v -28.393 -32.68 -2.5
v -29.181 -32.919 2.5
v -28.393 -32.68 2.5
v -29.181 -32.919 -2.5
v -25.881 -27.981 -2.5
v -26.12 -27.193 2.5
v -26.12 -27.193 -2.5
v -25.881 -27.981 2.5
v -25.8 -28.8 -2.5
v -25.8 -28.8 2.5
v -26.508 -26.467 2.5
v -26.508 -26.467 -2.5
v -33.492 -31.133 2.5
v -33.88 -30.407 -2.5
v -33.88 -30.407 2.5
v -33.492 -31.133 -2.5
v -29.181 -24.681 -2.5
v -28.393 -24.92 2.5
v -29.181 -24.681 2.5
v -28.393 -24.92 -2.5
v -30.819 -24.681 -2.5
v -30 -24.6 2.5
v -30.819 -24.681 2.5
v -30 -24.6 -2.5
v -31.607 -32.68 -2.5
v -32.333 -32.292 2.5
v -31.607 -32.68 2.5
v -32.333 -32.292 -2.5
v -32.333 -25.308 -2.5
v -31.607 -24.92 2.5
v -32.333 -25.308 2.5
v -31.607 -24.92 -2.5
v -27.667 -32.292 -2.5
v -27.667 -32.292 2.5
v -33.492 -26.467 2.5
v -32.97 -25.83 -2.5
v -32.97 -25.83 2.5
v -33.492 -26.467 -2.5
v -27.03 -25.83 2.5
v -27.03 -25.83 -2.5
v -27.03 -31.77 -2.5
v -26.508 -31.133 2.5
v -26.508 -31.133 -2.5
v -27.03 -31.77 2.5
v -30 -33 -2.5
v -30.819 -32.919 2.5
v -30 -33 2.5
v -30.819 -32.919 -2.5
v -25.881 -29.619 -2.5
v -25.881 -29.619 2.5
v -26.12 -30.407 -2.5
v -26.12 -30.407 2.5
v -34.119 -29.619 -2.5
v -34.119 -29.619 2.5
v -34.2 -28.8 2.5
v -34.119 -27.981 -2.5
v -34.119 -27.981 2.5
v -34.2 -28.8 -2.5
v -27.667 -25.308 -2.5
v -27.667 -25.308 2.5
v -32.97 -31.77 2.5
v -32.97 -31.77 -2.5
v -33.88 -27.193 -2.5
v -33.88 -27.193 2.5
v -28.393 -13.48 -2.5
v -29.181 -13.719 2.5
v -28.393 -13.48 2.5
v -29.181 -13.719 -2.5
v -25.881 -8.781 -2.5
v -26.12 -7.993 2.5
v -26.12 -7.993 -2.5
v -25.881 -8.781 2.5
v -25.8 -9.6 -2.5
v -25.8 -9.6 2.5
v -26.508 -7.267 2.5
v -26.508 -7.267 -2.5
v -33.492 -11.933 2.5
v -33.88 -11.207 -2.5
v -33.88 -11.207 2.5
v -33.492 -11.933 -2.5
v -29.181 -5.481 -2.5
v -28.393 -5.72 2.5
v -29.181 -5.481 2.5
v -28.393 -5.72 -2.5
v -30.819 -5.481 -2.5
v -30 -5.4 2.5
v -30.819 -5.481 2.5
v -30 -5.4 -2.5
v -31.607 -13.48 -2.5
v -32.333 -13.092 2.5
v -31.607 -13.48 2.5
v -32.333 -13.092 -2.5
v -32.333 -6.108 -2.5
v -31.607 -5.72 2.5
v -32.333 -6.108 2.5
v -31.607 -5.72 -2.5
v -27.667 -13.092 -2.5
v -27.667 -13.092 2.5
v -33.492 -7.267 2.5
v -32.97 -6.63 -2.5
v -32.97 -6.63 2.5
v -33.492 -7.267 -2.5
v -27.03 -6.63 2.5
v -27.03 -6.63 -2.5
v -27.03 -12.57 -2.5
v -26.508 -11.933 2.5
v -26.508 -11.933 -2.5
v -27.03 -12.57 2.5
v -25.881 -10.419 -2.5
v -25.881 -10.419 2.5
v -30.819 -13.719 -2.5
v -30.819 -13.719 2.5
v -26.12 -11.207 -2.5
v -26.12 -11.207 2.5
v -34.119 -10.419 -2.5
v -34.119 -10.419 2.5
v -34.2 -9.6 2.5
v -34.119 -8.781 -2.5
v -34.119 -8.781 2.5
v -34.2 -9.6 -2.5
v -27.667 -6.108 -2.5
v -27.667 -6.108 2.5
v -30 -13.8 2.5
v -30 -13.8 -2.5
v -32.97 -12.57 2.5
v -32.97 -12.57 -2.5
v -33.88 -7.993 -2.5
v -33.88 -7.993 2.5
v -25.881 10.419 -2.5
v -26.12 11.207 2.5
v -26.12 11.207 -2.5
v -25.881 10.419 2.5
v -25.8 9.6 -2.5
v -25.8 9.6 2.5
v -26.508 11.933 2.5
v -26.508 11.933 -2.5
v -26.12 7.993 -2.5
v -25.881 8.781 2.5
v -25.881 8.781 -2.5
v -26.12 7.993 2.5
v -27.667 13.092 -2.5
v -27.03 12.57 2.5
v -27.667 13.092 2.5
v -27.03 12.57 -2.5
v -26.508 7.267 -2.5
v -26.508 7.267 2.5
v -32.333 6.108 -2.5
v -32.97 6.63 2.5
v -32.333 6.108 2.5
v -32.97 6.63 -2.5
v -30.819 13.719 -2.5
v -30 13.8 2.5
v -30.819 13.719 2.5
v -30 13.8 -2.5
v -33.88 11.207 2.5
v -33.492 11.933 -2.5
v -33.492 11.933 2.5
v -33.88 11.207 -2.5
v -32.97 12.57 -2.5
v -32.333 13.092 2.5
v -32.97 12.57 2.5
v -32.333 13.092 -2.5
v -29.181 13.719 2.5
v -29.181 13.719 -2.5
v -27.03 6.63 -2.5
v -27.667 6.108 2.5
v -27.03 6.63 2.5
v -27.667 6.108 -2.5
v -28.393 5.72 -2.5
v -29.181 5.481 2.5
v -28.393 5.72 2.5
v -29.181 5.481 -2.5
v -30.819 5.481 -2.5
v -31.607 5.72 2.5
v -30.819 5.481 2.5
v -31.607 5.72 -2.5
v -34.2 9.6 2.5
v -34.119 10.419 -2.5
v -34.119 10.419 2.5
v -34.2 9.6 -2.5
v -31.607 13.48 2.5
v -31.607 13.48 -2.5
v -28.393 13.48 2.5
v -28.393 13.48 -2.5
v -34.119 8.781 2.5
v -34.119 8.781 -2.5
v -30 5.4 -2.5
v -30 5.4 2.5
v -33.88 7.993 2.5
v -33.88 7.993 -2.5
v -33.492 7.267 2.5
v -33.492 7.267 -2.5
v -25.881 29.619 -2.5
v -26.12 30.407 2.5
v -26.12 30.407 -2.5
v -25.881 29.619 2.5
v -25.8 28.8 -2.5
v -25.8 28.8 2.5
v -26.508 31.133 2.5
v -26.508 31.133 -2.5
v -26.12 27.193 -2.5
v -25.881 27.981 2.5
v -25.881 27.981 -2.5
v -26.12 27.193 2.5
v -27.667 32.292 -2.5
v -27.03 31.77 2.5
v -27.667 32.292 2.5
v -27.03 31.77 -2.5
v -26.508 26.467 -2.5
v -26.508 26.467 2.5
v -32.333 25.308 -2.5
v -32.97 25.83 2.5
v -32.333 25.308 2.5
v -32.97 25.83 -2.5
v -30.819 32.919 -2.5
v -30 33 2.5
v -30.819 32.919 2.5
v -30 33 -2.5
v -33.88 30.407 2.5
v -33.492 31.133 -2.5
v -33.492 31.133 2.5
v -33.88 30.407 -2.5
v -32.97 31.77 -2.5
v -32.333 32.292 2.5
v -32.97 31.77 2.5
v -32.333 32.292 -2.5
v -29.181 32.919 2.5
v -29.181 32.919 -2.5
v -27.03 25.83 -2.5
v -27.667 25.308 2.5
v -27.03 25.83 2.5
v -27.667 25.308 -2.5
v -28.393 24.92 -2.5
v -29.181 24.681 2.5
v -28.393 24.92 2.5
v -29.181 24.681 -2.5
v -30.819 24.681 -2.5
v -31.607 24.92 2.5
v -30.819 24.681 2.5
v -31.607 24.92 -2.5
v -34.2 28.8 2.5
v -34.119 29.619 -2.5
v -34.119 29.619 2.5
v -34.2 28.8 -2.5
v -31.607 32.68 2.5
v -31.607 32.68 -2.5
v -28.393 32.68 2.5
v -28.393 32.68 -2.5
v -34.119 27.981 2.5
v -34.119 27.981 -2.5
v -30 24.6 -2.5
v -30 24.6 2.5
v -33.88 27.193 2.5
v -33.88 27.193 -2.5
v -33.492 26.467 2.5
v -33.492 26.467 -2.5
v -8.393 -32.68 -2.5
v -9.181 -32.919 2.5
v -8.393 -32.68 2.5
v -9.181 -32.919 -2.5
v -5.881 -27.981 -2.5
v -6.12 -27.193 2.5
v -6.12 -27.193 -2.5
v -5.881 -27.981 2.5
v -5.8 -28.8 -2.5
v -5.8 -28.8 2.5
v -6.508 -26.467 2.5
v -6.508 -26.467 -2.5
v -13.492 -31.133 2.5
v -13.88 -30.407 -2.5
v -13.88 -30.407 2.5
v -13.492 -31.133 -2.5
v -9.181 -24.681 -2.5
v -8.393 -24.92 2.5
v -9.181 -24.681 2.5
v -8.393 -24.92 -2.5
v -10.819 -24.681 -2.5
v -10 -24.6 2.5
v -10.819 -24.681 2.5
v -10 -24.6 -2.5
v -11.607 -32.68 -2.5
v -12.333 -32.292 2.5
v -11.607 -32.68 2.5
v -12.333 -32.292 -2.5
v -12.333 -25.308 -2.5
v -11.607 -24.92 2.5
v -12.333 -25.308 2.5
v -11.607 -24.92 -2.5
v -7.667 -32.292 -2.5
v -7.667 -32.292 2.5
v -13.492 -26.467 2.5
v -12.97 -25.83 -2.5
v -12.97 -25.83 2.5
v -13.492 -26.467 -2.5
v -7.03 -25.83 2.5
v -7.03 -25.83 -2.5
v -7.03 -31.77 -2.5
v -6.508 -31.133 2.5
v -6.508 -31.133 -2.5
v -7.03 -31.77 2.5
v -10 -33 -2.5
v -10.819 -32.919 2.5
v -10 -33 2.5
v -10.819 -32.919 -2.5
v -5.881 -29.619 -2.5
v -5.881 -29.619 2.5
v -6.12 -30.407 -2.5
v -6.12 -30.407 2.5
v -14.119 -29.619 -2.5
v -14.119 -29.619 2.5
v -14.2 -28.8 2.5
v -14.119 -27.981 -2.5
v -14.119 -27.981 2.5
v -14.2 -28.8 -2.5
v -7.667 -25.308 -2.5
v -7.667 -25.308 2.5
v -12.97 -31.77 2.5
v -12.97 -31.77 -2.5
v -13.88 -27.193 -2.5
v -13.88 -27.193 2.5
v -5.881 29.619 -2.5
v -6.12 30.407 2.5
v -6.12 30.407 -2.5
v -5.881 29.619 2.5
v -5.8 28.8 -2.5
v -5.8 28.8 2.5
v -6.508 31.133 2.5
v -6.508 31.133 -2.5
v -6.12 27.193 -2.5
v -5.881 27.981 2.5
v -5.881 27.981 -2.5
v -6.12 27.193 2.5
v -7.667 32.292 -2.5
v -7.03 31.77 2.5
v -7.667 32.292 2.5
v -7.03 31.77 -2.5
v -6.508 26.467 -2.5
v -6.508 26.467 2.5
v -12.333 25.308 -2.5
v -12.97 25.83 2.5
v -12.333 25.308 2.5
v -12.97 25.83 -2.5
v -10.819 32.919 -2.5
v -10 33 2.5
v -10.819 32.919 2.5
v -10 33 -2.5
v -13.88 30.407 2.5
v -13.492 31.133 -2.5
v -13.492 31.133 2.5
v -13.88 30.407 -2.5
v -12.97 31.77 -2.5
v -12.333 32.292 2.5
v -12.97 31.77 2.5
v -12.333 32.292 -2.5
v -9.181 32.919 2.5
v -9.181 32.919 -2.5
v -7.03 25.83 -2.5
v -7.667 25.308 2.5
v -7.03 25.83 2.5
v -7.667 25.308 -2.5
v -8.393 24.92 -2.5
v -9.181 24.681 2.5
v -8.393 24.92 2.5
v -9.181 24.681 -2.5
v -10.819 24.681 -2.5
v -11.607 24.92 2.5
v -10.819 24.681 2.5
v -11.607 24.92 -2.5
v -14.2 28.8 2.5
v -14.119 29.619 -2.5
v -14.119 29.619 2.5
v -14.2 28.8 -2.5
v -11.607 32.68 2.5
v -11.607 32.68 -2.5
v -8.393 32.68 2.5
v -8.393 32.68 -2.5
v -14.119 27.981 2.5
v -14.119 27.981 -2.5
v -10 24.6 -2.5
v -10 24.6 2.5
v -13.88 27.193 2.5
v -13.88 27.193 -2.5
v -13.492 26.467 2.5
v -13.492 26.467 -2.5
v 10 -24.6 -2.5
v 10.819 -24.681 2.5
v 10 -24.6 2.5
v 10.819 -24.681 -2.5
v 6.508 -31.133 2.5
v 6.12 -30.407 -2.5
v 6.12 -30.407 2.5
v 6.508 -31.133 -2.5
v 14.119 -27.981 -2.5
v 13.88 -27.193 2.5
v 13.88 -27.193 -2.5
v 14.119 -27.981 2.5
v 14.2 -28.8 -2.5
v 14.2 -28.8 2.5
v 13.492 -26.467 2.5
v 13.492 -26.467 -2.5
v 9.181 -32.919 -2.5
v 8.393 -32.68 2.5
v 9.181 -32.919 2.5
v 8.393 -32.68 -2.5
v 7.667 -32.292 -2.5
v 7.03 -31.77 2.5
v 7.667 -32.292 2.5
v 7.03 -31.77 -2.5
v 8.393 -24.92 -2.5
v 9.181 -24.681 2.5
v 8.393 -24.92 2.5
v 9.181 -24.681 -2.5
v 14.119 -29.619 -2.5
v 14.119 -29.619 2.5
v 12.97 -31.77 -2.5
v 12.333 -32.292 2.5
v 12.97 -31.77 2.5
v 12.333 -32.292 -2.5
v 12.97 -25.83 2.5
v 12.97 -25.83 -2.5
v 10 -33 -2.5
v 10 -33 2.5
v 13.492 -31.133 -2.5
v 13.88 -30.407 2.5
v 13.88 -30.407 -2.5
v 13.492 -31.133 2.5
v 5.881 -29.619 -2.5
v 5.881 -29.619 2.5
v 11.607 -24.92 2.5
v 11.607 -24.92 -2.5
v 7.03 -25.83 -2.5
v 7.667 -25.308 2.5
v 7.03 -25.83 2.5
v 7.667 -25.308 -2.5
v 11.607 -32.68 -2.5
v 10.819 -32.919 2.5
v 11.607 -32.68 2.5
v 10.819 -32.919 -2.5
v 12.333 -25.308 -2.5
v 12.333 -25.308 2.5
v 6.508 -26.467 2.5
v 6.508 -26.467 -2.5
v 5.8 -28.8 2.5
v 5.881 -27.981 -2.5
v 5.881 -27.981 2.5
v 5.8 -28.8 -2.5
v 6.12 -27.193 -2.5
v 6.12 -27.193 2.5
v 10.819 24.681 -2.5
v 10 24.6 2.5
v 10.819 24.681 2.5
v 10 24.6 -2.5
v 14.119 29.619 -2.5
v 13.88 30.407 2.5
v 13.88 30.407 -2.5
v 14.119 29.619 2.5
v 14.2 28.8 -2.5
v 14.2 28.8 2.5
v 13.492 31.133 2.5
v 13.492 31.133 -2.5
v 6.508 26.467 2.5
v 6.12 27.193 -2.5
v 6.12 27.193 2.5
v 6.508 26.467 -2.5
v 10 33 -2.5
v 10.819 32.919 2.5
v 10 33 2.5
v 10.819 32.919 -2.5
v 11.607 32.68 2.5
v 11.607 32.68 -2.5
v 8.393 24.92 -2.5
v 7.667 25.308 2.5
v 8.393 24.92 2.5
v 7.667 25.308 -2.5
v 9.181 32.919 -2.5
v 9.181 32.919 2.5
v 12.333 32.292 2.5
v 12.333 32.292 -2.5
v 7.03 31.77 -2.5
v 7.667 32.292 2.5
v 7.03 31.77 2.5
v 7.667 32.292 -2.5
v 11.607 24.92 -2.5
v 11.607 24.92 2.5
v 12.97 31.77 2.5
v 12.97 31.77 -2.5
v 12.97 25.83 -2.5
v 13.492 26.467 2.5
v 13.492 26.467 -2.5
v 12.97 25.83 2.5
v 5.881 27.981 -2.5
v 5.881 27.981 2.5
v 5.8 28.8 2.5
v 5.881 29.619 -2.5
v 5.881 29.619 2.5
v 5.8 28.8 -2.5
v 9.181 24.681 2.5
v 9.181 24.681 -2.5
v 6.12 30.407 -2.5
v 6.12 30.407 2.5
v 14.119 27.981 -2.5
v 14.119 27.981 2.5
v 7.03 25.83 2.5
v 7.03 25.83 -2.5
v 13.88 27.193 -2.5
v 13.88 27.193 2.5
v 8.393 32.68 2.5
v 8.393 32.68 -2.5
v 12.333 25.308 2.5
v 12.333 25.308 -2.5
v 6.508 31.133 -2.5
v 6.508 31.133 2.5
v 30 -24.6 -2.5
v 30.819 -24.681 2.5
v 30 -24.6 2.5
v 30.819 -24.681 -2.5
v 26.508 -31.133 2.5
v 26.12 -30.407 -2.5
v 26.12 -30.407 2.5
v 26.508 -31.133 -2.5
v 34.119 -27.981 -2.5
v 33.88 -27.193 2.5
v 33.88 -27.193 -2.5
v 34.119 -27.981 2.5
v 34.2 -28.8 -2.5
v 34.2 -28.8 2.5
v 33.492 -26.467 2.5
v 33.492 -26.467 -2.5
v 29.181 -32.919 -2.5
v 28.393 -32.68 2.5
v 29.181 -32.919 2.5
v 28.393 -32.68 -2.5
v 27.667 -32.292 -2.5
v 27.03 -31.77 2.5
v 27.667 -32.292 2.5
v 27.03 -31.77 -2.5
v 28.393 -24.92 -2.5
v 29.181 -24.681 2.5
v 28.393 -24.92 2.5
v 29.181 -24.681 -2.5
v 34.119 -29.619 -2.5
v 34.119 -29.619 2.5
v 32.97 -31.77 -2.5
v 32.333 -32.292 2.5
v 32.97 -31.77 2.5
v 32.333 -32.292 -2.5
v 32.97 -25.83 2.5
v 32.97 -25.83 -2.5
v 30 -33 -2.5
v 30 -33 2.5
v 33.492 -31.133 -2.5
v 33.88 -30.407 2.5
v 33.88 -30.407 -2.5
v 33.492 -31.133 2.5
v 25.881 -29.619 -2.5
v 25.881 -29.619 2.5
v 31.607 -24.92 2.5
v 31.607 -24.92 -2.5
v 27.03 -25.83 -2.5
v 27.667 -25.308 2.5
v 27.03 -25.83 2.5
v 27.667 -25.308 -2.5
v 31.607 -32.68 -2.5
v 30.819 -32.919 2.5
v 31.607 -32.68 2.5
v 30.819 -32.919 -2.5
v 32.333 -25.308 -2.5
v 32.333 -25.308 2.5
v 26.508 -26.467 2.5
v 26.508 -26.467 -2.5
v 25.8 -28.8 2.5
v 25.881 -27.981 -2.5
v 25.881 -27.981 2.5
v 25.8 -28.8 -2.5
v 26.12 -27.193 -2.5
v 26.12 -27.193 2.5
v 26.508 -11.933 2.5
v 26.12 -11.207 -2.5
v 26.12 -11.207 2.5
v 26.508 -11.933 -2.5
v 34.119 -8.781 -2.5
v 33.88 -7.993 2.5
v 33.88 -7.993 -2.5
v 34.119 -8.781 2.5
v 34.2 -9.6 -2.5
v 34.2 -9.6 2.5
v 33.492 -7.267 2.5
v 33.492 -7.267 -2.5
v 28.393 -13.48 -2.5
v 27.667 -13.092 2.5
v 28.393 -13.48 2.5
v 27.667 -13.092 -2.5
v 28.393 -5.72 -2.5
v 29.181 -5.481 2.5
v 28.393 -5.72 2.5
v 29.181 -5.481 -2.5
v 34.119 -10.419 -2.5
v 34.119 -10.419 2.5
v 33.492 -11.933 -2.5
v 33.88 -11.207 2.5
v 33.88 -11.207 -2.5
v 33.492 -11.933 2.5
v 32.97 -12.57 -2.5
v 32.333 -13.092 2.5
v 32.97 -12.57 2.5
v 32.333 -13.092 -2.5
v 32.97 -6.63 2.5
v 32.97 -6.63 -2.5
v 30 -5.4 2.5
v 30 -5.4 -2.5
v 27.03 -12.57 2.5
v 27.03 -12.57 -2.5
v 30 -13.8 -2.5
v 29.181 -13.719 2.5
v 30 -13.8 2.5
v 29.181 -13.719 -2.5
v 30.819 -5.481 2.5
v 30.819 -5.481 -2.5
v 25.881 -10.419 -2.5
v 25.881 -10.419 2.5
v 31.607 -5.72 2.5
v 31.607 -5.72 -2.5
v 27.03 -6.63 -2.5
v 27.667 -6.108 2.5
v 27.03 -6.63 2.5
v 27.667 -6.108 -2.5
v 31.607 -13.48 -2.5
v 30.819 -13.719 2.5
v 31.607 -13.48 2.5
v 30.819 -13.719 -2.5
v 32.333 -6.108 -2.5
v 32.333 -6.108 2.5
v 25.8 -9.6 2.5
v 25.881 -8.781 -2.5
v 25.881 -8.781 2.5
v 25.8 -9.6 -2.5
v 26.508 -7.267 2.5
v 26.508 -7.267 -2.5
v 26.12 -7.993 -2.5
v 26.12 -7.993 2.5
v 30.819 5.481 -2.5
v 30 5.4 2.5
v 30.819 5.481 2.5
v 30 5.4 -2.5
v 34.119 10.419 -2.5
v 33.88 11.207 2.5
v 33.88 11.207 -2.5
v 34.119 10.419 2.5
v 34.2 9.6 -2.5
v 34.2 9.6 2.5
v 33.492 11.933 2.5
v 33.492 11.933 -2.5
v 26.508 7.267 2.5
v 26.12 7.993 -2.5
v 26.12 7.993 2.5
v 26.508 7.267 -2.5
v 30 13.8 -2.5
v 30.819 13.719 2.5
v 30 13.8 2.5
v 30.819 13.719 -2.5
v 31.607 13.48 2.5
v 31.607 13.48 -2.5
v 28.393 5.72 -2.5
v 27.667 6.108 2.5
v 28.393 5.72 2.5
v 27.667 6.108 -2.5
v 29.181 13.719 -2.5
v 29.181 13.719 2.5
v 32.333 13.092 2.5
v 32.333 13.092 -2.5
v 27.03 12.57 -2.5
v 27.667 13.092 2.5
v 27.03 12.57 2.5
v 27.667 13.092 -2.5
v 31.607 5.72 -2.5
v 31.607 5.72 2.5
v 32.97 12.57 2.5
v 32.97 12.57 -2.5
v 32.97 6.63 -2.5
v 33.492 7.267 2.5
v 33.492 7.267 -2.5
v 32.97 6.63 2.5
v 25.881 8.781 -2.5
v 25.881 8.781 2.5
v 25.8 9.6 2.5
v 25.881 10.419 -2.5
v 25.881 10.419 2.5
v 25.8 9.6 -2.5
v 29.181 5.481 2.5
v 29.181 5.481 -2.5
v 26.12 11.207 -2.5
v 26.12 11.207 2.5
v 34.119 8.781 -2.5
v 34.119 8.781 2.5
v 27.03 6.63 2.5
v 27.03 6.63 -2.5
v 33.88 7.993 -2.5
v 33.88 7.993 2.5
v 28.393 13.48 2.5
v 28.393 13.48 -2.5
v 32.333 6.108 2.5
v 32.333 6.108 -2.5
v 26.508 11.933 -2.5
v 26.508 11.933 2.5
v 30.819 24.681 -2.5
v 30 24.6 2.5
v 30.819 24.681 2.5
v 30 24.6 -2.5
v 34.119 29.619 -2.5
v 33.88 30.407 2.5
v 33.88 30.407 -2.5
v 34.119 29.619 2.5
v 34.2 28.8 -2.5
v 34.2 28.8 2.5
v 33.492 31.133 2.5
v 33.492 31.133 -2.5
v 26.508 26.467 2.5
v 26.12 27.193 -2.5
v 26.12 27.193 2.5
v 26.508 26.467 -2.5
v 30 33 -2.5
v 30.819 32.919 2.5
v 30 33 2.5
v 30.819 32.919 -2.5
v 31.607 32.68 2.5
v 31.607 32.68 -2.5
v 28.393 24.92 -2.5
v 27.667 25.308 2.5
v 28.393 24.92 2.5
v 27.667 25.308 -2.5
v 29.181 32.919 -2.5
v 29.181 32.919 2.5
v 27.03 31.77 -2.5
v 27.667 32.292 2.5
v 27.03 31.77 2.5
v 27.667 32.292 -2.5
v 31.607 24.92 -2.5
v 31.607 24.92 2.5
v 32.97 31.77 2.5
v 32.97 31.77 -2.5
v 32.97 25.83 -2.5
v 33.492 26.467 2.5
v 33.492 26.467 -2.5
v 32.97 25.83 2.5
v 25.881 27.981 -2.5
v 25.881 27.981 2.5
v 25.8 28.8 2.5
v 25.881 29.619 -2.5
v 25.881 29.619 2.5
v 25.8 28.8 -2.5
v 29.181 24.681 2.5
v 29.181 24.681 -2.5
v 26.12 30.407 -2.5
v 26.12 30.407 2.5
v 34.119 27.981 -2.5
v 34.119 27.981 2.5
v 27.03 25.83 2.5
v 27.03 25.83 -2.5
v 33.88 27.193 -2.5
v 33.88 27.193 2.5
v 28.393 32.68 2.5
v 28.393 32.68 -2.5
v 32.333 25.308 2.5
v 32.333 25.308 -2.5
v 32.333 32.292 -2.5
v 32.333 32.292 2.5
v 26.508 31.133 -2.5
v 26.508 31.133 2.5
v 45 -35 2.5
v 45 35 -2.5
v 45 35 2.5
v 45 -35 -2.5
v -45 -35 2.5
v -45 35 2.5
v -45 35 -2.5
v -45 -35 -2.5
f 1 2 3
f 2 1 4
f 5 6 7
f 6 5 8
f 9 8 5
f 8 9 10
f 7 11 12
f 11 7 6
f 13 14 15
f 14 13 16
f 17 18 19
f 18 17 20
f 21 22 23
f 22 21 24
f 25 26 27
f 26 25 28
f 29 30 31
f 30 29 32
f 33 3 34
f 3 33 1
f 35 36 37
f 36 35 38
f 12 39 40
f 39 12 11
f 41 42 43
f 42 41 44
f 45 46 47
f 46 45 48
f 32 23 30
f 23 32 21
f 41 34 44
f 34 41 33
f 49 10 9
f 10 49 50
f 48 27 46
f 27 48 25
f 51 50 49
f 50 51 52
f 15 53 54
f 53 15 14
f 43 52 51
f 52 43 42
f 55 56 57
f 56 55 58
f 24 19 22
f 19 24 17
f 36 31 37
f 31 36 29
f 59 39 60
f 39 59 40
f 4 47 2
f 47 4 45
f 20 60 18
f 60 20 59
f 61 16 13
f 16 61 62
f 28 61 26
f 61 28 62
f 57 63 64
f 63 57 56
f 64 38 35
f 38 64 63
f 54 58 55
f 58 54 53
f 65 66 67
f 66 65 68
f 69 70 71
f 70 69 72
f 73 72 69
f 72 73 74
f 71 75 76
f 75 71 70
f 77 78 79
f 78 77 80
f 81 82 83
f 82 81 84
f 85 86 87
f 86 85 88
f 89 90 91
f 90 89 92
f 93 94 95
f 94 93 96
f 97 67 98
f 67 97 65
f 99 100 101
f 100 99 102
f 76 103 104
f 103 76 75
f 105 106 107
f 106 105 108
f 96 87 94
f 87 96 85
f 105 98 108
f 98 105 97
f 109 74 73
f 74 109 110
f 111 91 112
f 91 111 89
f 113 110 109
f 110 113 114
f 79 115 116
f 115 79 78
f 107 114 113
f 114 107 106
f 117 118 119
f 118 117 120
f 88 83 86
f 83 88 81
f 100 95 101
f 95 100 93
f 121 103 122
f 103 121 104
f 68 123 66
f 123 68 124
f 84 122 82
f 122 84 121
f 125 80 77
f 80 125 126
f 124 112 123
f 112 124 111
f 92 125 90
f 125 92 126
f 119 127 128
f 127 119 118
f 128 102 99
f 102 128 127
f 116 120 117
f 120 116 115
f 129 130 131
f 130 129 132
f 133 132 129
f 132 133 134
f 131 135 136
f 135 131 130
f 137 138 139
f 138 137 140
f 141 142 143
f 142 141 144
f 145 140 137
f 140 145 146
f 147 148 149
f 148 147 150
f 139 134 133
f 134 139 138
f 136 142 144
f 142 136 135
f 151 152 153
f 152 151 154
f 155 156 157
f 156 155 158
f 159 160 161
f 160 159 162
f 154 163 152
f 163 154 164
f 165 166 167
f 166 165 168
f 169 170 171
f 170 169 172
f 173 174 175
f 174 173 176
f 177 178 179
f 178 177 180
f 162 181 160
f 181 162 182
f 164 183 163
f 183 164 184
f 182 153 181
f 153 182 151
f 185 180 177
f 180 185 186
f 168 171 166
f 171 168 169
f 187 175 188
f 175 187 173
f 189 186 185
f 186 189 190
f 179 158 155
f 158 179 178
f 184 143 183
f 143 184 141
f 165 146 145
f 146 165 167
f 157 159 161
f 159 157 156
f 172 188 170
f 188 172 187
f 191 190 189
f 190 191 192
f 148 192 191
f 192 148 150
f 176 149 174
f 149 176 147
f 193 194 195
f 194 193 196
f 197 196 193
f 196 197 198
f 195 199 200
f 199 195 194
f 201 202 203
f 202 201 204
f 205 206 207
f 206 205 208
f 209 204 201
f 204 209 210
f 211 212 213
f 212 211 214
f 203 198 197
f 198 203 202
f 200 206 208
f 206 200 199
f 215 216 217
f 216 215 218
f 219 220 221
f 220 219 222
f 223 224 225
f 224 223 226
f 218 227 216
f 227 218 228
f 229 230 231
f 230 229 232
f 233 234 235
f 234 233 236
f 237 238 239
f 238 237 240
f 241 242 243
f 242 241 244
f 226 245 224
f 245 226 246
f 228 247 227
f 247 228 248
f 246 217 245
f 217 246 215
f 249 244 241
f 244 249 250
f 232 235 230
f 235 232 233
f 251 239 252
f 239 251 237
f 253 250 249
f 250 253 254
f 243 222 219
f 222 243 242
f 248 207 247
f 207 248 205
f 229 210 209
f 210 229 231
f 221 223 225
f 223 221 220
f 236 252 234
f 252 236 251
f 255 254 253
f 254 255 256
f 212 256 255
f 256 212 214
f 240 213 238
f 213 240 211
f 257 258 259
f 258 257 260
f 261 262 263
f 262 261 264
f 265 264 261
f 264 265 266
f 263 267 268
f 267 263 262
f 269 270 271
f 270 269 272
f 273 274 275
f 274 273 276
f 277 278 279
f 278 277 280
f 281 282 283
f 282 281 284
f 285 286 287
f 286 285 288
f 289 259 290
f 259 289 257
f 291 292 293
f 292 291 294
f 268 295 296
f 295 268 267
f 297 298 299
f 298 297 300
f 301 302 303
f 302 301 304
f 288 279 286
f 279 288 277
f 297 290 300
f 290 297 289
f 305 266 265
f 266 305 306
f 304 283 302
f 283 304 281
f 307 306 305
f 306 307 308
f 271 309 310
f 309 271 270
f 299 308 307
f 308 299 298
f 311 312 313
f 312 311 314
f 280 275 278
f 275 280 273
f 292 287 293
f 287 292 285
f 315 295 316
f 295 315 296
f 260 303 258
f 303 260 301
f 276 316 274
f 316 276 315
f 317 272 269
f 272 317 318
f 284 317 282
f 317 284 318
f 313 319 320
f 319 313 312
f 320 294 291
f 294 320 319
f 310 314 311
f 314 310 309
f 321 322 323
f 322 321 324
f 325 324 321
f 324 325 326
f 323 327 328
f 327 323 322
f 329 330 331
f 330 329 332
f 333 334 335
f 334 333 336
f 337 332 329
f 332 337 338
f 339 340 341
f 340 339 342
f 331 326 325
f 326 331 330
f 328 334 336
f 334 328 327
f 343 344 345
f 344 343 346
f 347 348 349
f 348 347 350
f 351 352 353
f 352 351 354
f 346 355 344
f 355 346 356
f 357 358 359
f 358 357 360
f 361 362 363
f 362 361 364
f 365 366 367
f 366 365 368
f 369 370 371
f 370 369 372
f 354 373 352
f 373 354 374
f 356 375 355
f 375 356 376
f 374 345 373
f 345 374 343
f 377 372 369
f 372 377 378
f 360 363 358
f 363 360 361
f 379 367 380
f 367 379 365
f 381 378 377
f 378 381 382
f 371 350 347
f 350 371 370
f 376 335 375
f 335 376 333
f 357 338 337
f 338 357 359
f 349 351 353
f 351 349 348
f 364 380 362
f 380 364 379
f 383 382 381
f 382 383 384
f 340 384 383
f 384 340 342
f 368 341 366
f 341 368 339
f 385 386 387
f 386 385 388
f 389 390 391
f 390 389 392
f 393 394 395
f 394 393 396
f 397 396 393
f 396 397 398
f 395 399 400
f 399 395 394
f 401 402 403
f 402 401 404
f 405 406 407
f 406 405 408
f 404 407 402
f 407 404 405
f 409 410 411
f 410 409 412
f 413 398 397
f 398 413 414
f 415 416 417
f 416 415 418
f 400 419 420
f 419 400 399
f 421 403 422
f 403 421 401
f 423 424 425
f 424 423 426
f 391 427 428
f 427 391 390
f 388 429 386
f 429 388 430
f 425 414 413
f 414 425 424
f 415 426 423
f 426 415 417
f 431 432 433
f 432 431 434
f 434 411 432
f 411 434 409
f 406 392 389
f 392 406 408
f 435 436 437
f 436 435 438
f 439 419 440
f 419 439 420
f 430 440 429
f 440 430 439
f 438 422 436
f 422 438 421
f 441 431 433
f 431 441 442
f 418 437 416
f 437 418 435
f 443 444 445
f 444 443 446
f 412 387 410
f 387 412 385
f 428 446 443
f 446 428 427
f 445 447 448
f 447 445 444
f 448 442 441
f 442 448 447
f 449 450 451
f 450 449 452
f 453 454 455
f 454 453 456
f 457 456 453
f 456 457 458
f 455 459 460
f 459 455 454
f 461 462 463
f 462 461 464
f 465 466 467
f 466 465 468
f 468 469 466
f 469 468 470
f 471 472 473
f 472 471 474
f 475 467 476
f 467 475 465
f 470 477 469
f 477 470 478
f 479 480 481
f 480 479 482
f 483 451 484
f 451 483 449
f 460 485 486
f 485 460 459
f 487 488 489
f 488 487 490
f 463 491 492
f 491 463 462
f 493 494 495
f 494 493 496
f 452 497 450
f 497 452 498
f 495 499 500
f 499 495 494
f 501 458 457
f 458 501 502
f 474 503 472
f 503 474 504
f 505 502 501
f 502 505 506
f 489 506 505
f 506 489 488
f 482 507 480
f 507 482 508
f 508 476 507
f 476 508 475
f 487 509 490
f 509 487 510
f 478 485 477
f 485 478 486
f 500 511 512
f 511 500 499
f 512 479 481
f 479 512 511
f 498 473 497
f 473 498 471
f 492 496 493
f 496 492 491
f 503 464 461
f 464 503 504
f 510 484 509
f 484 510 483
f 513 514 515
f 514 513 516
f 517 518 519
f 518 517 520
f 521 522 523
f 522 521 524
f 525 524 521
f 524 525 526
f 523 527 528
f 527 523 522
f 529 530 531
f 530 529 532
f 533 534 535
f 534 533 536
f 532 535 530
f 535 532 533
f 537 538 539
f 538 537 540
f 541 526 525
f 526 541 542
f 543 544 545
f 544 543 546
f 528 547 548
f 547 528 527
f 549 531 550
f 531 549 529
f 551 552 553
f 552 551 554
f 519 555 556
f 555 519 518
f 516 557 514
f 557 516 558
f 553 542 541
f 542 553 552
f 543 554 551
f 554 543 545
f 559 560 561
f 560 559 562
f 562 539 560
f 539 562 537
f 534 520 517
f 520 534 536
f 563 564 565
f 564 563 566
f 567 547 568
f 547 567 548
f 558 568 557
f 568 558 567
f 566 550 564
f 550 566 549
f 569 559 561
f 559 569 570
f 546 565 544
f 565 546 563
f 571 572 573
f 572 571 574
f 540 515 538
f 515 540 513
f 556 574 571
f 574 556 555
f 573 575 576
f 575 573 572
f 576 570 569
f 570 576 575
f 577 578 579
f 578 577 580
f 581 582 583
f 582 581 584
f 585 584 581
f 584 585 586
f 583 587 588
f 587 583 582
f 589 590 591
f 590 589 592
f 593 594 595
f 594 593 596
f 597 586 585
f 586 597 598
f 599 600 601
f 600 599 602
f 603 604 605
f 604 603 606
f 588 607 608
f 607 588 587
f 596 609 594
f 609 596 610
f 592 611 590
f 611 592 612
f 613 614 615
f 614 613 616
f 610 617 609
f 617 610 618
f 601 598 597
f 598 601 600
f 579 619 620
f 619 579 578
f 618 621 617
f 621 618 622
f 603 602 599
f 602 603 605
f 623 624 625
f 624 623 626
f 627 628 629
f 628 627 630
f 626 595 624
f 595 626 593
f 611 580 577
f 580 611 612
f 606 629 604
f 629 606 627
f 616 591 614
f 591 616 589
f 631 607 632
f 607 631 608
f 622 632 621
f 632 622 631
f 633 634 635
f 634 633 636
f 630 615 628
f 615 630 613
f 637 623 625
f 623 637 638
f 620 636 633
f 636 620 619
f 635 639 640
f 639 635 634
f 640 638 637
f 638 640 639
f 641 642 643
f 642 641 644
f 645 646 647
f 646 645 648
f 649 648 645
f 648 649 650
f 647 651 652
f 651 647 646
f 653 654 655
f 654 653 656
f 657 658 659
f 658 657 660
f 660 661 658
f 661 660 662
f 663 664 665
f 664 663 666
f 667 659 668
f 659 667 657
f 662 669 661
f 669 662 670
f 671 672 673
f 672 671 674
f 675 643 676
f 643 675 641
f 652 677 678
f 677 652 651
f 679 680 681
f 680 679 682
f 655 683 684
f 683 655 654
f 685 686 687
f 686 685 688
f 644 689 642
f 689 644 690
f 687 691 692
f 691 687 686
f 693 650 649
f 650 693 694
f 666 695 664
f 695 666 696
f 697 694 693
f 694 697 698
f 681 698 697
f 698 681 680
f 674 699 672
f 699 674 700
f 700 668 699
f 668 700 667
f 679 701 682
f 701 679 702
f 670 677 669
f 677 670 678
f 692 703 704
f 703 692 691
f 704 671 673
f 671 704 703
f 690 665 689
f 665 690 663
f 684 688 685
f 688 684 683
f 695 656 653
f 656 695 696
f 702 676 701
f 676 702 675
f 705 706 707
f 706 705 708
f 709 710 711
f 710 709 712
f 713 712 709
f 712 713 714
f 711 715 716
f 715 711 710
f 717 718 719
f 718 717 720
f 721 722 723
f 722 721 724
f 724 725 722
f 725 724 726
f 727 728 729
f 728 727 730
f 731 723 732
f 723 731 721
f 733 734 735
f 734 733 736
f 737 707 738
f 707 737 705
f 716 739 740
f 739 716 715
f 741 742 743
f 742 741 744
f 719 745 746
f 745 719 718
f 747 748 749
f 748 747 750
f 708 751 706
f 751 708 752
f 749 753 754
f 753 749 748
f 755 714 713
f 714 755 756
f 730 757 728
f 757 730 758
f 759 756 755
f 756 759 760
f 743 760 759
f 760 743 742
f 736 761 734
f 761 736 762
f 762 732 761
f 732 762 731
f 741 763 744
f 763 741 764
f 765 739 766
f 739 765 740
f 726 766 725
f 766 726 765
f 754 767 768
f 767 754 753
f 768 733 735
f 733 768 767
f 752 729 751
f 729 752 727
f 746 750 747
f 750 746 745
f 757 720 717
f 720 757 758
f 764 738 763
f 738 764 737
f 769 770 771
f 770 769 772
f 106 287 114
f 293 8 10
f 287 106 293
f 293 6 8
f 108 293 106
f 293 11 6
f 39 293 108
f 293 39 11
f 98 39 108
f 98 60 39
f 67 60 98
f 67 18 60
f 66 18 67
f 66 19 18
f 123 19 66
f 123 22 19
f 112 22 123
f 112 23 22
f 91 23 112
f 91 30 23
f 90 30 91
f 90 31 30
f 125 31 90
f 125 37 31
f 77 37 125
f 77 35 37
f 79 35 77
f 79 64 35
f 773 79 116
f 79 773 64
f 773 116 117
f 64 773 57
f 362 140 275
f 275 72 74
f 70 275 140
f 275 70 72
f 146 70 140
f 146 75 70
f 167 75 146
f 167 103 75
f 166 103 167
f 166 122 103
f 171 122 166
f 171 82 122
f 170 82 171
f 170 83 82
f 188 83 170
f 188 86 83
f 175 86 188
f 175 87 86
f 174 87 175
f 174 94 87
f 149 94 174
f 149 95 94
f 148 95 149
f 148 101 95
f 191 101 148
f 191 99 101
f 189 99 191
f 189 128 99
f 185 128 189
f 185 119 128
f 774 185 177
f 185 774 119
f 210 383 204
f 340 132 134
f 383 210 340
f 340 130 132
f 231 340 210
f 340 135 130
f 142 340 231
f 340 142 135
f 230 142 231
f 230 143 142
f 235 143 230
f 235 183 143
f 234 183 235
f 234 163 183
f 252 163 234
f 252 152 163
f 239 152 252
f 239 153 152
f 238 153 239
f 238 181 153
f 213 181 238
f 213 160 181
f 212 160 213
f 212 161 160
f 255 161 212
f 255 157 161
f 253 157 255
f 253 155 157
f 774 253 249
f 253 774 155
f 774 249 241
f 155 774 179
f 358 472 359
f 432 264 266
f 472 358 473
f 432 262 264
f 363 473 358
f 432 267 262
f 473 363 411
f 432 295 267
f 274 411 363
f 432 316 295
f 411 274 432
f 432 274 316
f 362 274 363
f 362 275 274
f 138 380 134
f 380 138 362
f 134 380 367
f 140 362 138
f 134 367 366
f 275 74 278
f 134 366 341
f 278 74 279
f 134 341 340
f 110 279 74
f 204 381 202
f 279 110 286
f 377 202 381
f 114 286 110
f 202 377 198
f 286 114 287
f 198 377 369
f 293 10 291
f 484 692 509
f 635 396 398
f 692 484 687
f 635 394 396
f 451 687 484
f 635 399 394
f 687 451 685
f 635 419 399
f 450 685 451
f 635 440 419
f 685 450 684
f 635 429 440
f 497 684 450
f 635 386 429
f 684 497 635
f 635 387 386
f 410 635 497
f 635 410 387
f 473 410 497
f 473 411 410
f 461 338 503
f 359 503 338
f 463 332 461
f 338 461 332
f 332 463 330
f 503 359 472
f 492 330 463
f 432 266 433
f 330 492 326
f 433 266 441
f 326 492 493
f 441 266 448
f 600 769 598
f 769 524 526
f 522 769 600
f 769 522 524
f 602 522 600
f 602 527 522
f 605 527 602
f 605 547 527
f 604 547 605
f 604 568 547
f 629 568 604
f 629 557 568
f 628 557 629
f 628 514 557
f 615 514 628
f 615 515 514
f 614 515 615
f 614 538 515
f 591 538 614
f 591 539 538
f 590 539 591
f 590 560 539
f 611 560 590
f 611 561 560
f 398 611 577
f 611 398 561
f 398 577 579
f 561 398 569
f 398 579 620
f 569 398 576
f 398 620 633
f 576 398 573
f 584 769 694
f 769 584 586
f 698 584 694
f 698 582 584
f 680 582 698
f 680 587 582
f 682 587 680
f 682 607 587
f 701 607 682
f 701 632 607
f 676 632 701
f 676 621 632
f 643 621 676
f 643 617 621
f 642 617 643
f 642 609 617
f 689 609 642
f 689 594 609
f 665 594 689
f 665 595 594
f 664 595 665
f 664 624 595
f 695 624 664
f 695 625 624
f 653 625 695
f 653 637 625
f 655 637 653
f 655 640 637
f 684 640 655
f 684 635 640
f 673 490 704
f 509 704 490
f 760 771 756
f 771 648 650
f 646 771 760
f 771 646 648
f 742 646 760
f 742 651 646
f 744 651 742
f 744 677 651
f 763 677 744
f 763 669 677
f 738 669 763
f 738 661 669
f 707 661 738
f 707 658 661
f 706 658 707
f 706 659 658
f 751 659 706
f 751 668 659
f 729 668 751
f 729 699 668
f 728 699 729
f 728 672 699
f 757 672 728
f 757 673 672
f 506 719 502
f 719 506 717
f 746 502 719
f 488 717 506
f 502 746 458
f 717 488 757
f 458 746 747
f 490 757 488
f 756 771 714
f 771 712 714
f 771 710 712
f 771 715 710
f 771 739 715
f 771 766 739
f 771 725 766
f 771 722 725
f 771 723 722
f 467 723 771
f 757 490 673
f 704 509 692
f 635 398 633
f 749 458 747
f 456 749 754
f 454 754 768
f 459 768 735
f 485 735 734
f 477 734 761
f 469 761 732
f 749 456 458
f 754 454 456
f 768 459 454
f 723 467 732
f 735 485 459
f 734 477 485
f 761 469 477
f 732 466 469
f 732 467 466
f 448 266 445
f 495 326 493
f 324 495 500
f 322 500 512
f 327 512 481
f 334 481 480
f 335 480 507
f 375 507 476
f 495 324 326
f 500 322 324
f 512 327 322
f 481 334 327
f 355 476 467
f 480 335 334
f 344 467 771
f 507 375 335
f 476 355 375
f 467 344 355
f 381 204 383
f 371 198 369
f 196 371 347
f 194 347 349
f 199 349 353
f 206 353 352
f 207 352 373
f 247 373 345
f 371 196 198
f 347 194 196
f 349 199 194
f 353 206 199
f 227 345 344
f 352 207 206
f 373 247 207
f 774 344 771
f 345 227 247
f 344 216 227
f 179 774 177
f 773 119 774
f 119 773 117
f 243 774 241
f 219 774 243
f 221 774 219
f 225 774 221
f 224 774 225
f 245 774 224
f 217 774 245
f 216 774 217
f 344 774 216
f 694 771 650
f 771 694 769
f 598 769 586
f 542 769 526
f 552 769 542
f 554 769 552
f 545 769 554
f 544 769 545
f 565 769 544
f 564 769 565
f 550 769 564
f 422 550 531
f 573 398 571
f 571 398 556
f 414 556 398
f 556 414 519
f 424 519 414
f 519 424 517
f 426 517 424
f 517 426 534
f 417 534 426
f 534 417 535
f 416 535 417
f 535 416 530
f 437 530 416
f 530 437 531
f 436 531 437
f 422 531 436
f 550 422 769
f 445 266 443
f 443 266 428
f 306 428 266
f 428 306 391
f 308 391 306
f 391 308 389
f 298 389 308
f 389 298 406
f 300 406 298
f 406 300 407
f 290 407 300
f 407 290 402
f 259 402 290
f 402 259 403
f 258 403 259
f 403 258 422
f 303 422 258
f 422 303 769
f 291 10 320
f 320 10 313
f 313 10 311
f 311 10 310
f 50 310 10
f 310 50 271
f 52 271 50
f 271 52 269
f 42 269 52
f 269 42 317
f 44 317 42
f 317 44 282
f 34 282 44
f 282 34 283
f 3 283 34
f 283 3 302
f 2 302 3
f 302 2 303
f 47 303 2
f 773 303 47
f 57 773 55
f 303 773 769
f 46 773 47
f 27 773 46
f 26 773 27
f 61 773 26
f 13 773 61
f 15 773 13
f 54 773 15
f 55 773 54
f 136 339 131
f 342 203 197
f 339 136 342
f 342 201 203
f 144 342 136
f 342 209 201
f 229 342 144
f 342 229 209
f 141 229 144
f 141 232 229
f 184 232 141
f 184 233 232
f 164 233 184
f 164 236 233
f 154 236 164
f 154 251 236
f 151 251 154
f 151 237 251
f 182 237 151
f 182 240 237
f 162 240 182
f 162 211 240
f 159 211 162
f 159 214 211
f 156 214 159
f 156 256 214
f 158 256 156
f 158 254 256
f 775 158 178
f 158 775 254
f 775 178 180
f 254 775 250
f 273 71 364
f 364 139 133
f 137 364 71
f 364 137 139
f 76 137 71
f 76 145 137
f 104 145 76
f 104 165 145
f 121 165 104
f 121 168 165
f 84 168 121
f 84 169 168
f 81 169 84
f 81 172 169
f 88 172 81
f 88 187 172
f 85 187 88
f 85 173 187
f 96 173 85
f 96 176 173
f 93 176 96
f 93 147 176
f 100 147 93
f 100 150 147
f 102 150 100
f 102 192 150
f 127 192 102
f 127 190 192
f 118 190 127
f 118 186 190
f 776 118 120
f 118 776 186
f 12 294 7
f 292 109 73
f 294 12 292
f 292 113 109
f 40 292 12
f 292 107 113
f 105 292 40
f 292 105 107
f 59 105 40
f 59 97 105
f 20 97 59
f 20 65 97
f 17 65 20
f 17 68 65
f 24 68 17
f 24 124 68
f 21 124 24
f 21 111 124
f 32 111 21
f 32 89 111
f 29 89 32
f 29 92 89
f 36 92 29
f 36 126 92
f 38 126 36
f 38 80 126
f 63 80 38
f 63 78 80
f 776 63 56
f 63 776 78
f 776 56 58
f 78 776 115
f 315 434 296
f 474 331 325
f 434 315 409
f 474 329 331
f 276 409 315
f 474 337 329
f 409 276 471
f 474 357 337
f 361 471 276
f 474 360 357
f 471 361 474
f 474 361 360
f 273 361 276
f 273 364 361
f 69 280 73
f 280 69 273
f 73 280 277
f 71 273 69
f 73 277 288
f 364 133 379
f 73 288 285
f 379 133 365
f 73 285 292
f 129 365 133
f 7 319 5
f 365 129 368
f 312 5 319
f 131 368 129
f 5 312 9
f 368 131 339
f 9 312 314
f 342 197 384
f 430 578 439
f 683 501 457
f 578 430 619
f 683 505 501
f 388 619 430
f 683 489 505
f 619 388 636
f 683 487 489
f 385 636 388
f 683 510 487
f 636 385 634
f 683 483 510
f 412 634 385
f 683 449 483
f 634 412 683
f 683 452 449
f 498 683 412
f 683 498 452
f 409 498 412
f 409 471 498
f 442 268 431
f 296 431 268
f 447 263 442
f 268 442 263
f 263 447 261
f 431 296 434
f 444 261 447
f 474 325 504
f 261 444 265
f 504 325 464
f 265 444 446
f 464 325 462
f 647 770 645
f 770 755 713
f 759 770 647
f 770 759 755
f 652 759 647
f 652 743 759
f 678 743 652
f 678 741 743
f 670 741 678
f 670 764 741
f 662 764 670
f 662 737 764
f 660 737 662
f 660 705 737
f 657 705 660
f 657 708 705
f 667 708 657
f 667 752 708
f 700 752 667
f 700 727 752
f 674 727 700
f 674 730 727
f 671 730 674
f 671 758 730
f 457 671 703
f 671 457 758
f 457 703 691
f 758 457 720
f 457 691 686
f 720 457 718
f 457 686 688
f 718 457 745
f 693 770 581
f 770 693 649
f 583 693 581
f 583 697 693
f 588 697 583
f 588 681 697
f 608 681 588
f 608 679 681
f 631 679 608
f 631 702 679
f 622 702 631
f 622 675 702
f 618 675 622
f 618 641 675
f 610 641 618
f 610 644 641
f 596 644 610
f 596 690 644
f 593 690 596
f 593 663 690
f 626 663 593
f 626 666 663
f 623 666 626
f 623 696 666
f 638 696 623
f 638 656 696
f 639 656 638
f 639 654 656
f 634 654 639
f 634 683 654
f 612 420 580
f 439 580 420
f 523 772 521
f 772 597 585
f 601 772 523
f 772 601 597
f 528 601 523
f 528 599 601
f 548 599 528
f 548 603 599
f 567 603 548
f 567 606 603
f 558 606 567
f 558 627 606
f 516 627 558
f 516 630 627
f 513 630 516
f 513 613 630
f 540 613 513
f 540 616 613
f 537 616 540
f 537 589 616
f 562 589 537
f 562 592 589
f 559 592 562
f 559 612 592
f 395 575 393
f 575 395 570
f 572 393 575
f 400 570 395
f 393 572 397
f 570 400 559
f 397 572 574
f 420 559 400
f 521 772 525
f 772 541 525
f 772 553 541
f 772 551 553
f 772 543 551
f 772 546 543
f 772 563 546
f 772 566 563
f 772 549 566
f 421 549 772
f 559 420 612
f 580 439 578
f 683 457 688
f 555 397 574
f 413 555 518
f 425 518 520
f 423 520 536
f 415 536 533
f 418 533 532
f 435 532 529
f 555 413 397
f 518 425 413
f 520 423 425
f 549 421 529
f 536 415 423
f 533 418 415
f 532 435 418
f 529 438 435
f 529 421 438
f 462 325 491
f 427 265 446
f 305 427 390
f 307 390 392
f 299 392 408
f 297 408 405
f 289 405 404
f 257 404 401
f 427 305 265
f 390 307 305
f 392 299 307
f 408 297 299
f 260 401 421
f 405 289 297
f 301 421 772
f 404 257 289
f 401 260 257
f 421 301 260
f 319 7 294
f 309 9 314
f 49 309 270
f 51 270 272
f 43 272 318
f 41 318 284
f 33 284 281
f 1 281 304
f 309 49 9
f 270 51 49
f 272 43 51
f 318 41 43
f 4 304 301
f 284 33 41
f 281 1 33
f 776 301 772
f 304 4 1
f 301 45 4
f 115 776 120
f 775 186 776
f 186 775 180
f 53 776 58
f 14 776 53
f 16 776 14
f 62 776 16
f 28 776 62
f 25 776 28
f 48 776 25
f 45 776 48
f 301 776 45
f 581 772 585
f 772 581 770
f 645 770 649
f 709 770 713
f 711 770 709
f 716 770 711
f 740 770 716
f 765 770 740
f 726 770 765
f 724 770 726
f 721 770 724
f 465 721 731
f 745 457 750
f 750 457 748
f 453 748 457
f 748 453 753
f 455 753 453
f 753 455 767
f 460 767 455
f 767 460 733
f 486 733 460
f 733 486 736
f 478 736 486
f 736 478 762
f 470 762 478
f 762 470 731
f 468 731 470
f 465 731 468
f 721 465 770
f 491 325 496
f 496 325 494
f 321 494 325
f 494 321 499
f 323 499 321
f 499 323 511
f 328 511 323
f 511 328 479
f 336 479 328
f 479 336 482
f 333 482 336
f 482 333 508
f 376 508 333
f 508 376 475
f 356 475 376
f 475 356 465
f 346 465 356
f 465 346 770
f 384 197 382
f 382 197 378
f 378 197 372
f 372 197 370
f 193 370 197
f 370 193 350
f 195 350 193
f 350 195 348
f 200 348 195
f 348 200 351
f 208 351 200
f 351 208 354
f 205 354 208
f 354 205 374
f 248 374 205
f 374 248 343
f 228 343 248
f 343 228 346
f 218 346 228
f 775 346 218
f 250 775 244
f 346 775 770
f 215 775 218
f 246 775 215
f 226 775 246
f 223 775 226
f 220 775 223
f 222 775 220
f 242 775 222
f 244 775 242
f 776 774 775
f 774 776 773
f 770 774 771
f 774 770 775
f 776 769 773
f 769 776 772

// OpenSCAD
$fn = 32;

// ----------------------------------------------------------------------
// Perforated panel 90 x 70 x 5
// 4 x 4 Ø8.4 holes, frame layout
// ----------------------------------------------------------------------

// --- parameters (mm) ---
panel = [90, 70, 5];  // overall size (x, y, z)
hole_d = 8.4;         // hole diameter
pitch_x = 20;         // hole pitch along X
pitch_y = 19.2;       // hole pitch along Y

// --- derived feature positions (mm) ---
margin = hole_d / 2 + 2;            // = 6.2   clearance from the panel edge
cols = floor((panel[0] - 2 * margin) / pitch_x) + 1;  // = 4   how many columns fit in X
rows = floor((panel[1] - 2 * margin) / pitch_y) + 1;  // = 4   how many rows fit in Y
span_x = (cols - 1) * pitch_x + 0;  // = 60   width of the field
span_y = (rows - 1) * pitch_y;      // = 57.6   height of the field
origin_x = -span_x / 2;             // = -30   X of the first hole
origin_y = -span_y / 2;             // = -28.8   Y of the first row
holes = 2 * cols + 2 * (rows - 2);  // = 12   holes around the frame
feature_centers = [
  [origin_x + 0 * pitch_x, origin_y + 0 * pitch_y],
  [origin_x + 0 * pitch_x, origin_y + 1 * pitch_y],
  [origin_x + 0 * pitch_x, origin_y + 2 * pitch_y],
  [origin_x + 0 * pitch_x, origin_y + 3 * pitch_y],
  [origin_x + 1 * pitch_x, origin_y + 0 * pitch_y],
  [origin_x + 1 * pitch_x, origin_y + 3 * pitch_y],
  [origin_x + 2 * pitch_x, origin_y + 0 * pitch_y],
  [origin_x + 2 * pitch_x, origin_y + 3 * pitch_y],
  [origin_x + 3 * pitch_x, origin_y + 0 * pitch_y],
  [origin_x + 3 * pitch_x, origin_y + 1 * pitch_y],
  [origin_x + 3 * pitch_x, origin_y + 2 * pitch_y],
  [origin_x + 3 * pitch_x, origin_y + 3 * pitch_y]
];   // hole centres, used verbatim by the cutter loop

// panel outline, every hole through
difference() {
  cube(panel, center = true);
  for (centre = feature_centers)
    translate([centre[0], centre[1], 0])
      cylinder(d = hole_d, h = panel[2] + 2, center = true);
}
